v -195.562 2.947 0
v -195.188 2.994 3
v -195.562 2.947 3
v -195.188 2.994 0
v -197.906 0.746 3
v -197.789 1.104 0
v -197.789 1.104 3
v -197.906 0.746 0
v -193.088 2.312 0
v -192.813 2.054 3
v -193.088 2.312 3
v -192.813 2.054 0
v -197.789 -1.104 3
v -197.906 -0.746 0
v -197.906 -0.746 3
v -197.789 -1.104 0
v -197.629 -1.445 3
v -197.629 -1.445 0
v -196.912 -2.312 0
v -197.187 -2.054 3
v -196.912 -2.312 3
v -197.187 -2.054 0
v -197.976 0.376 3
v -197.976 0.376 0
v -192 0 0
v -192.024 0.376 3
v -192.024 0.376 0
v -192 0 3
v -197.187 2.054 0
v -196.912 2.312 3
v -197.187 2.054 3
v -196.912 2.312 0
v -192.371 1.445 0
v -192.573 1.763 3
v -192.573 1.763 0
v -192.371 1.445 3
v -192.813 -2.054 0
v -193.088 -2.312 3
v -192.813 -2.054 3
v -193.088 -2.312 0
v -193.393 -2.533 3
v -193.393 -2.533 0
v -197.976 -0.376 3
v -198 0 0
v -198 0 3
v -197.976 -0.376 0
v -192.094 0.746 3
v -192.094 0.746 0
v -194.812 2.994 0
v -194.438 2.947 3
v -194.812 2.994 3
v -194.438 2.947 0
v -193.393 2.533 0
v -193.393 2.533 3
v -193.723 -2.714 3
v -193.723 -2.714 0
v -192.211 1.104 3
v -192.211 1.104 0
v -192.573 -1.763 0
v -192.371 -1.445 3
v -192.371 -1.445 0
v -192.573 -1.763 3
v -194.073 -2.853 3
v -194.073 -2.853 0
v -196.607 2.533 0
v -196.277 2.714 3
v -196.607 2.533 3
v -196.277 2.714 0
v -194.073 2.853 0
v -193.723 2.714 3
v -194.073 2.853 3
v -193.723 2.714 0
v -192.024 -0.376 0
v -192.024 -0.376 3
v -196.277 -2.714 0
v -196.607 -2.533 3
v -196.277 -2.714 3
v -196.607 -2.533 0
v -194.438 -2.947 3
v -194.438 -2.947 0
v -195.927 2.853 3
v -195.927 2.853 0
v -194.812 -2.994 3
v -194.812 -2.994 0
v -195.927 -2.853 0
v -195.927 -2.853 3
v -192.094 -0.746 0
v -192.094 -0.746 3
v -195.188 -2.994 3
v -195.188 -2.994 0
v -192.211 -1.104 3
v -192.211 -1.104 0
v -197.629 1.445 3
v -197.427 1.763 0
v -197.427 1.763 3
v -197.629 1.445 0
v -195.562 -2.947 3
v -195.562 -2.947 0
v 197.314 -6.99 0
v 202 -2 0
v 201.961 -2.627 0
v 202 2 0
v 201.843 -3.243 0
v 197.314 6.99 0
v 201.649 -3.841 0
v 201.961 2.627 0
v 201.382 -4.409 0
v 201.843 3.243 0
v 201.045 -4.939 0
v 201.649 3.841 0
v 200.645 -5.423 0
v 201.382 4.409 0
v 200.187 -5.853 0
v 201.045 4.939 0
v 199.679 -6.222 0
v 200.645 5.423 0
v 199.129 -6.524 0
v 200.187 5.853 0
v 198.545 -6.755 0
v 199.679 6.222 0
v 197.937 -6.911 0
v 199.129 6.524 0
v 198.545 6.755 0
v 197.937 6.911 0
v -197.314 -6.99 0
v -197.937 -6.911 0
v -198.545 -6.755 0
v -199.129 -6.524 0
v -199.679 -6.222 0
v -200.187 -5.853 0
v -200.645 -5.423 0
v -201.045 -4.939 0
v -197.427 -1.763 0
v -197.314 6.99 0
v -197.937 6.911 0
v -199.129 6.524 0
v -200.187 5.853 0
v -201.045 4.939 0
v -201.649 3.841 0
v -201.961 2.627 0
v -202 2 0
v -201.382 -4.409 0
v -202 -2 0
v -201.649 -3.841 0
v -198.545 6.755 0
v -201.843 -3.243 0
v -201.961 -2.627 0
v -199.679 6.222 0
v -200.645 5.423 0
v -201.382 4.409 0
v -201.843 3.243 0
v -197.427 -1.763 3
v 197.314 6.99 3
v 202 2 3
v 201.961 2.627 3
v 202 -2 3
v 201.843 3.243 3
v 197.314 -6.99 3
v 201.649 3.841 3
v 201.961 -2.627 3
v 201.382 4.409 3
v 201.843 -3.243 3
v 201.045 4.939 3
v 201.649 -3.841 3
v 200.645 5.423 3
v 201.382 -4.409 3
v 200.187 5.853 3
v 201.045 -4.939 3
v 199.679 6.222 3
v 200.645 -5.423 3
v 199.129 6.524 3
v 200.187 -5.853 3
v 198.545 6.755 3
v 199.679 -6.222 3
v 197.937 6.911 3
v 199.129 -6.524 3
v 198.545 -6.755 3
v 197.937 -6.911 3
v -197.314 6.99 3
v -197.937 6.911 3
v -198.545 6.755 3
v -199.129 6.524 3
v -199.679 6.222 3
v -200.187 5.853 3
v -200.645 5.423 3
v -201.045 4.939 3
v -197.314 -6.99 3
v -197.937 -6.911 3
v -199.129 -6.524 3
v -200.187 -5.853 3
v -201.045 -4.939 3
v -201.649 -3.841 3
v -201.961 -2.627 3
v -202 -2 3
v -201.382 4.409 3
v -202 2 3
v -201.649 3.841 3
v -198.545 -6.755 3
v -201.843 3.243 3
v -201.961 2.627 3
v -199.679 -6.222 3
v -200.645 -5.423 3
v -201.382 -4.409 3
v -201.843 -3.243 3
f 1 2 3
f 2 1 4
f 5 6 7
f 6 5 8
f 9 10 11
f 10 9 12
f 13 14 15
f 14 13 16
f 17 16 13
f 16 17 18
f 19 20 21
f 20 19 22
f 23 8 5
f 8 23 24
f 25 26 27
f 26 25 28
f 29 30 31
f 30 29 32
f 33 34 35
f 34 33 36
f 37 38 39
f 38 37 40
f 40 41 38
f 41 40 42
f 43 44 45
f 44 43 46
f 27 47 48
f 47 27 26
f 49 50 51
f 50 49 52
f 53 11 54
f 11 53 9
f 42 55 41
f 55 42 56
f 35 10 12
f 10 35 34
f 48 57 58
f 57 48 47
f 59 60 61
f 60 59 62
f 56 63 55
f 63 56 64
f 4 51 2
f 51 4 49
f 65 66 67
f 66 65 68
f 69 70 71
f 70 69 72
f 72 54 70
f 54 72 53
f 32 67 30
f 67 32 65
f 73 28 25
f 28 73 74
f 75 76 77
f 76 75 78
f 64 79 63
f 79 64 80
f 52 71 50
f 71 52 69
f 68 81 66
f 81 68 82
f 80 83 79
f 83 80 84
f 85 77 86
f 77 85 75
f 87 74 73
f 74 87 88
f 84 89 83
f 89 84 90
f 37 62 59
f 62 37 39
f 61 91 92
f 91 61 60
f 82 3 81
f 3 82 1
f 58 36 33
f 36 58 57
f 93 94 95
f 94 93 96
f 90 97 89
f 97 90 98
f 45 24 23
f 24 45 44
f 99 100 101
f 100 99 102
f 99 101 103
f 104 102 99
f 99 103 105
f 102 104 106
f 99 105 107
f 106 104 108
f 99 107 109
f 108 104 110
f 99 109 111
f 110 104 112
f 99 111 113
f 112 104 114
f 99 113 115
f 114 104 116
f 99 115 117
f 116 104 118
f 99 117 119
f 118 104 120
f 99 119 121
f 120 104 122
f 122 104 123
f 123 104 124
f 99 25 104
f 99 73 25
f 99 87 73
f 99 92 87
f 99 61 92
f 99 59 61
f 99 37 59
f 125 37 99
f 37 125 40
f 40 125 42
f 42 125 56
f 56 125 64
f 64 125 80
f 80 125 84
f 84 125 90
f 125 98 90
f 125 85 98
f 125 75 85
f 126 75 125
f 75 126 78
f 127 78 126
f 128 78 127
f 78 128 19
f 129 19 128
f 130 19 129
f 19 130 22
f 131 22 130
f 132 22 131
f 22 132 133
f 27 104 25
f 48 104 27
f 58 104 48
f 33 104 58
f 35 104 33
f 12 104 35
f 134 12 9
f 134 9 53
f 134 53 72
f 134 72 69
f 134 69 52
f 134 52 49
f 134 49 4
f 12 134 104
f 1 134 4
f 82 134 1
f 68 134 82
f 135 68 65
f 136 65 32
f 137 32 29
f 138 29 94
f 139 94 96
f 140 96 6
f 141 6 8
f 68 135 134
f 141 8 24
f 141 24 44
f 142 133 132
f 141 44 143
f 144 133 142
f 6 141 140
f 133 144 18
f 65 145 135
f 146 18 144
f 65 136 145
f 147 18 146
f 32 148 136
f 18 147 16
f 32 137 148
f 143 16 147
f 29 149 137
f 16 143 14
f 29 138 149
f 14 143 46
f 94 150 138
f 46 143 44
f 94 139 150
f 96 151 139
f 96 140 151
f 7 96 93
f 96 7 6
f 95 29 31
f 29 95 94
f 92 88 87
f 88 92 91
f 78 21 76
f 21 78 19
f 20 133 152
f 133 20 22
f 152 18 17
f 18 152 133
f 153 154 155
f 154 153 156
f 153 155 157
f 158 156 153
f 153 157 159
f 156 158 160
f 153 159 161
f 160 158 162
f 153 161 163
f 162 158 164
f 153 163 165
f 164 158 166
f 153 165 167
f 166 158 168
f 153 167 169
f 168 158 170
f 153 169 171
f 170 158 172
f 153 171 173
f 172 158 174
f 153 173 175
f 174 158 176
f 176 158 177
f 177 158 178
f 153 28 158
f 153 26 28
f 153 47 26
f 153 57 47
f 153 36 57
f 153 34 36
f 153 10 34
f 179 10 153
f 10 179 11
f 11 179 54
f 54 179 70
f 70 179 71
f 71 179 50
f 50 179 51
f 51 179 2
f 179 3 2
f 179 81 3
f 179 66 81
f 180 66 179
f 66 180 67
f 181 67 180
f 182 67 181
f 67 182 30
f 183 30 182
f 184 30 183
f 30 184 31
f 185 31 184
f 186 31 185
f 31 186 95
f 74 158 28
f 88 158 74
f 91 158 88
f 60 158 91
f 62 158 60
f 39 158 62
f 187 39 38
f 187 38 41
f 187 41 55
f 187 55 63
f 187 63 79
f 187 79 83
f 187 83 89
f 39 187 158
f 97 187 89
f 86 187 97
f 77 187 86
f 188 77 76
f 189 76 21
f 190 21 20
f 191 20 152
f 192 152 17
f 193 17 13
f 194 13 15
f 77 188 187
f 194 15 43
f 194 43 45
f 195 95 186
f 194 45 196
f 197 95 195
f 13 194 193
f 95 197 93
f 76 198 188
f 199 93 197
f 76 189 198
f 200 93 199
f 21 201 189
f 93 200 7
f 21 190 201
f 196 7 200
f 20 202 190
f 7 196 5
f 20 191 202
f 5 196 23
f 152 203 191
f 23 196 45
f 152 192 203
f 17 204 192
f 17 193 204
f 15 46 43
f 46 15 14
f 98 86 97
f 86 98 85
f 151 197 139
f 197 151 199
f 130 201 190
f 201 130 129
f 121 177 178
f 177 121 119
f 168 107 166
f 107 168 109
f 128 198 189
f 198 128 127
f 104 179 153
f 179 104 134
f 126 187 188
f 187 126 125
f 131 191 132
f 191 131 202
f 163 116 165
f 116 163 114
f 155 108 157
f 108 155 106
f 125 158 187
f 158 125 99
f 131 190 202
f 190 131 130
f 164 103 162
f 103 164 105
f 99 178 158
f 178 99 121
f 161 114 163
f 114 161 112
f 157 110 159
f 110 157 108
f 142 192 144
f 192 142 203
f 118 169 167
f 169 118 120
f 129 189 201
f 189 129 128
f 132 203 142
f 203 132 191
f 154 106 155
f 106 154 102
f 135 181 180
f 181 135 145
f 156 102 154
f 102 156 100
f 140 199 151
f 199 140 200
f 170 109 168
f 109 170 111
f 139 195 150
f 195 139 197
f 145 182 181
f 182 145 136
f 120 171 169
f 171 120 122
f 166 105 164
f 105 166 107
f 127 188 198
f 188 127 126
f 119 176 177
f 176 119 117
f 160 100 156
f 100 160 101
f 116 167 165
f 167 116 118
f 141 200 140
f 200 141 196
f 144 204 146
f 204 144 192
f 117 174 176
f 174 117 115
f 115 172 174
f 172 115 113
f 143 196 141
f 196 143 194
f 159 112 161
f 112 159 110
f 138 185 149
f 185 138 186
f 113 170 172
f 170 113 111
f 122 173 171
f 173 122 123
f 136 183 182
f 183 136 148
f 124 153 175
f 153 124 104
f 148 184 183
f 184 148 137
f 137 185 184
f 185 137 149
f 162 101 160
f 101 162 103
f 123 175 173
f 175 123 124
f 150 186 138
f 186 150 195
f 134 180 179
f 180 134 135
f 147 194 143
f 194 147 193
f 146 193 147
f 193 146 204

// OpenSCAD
$fn = 50;


difference() {
	union() {
		hull() {
			translate(v = [-197.0000000000, 2.0000000000, 0]) {
				cylinder(h = 3, r = 5);
			}
			translate(v = [197.0000000000, 2.0000000000, 0]) {
				cylinder(h = 3, r = 5);
			}
			translate(v = [-197.0000000000, -2.0000000000, 0]) {
				cylinder(h = 3, r = 5);
			}
			translate(v = [197.0000000000, -2.0000000000, 0]) {
				cylinder(h = 3, r = 5);
			}
		}
	}
	union() {
		translate(v = [-195.0000000000, 0.0000000000, 0]) {
			cylinder(h = 3, r = 3.0000000000);
		}
		translate(v = [-195.0000000000, 0.0000000000, 0]) {
			cylinder(h = 3, r = 1.5000000000);
		}
		translate(v = [-195.0000000000, 0.0000000000, 0]) {
			cylinder(h = 3, r = 1.5000000000);
		}
		translate(v = [-195.0000000000, 0.0000000000, 0]) {
			cylinder(h = 3, r = 1.5000000000);
		}
	}
}
